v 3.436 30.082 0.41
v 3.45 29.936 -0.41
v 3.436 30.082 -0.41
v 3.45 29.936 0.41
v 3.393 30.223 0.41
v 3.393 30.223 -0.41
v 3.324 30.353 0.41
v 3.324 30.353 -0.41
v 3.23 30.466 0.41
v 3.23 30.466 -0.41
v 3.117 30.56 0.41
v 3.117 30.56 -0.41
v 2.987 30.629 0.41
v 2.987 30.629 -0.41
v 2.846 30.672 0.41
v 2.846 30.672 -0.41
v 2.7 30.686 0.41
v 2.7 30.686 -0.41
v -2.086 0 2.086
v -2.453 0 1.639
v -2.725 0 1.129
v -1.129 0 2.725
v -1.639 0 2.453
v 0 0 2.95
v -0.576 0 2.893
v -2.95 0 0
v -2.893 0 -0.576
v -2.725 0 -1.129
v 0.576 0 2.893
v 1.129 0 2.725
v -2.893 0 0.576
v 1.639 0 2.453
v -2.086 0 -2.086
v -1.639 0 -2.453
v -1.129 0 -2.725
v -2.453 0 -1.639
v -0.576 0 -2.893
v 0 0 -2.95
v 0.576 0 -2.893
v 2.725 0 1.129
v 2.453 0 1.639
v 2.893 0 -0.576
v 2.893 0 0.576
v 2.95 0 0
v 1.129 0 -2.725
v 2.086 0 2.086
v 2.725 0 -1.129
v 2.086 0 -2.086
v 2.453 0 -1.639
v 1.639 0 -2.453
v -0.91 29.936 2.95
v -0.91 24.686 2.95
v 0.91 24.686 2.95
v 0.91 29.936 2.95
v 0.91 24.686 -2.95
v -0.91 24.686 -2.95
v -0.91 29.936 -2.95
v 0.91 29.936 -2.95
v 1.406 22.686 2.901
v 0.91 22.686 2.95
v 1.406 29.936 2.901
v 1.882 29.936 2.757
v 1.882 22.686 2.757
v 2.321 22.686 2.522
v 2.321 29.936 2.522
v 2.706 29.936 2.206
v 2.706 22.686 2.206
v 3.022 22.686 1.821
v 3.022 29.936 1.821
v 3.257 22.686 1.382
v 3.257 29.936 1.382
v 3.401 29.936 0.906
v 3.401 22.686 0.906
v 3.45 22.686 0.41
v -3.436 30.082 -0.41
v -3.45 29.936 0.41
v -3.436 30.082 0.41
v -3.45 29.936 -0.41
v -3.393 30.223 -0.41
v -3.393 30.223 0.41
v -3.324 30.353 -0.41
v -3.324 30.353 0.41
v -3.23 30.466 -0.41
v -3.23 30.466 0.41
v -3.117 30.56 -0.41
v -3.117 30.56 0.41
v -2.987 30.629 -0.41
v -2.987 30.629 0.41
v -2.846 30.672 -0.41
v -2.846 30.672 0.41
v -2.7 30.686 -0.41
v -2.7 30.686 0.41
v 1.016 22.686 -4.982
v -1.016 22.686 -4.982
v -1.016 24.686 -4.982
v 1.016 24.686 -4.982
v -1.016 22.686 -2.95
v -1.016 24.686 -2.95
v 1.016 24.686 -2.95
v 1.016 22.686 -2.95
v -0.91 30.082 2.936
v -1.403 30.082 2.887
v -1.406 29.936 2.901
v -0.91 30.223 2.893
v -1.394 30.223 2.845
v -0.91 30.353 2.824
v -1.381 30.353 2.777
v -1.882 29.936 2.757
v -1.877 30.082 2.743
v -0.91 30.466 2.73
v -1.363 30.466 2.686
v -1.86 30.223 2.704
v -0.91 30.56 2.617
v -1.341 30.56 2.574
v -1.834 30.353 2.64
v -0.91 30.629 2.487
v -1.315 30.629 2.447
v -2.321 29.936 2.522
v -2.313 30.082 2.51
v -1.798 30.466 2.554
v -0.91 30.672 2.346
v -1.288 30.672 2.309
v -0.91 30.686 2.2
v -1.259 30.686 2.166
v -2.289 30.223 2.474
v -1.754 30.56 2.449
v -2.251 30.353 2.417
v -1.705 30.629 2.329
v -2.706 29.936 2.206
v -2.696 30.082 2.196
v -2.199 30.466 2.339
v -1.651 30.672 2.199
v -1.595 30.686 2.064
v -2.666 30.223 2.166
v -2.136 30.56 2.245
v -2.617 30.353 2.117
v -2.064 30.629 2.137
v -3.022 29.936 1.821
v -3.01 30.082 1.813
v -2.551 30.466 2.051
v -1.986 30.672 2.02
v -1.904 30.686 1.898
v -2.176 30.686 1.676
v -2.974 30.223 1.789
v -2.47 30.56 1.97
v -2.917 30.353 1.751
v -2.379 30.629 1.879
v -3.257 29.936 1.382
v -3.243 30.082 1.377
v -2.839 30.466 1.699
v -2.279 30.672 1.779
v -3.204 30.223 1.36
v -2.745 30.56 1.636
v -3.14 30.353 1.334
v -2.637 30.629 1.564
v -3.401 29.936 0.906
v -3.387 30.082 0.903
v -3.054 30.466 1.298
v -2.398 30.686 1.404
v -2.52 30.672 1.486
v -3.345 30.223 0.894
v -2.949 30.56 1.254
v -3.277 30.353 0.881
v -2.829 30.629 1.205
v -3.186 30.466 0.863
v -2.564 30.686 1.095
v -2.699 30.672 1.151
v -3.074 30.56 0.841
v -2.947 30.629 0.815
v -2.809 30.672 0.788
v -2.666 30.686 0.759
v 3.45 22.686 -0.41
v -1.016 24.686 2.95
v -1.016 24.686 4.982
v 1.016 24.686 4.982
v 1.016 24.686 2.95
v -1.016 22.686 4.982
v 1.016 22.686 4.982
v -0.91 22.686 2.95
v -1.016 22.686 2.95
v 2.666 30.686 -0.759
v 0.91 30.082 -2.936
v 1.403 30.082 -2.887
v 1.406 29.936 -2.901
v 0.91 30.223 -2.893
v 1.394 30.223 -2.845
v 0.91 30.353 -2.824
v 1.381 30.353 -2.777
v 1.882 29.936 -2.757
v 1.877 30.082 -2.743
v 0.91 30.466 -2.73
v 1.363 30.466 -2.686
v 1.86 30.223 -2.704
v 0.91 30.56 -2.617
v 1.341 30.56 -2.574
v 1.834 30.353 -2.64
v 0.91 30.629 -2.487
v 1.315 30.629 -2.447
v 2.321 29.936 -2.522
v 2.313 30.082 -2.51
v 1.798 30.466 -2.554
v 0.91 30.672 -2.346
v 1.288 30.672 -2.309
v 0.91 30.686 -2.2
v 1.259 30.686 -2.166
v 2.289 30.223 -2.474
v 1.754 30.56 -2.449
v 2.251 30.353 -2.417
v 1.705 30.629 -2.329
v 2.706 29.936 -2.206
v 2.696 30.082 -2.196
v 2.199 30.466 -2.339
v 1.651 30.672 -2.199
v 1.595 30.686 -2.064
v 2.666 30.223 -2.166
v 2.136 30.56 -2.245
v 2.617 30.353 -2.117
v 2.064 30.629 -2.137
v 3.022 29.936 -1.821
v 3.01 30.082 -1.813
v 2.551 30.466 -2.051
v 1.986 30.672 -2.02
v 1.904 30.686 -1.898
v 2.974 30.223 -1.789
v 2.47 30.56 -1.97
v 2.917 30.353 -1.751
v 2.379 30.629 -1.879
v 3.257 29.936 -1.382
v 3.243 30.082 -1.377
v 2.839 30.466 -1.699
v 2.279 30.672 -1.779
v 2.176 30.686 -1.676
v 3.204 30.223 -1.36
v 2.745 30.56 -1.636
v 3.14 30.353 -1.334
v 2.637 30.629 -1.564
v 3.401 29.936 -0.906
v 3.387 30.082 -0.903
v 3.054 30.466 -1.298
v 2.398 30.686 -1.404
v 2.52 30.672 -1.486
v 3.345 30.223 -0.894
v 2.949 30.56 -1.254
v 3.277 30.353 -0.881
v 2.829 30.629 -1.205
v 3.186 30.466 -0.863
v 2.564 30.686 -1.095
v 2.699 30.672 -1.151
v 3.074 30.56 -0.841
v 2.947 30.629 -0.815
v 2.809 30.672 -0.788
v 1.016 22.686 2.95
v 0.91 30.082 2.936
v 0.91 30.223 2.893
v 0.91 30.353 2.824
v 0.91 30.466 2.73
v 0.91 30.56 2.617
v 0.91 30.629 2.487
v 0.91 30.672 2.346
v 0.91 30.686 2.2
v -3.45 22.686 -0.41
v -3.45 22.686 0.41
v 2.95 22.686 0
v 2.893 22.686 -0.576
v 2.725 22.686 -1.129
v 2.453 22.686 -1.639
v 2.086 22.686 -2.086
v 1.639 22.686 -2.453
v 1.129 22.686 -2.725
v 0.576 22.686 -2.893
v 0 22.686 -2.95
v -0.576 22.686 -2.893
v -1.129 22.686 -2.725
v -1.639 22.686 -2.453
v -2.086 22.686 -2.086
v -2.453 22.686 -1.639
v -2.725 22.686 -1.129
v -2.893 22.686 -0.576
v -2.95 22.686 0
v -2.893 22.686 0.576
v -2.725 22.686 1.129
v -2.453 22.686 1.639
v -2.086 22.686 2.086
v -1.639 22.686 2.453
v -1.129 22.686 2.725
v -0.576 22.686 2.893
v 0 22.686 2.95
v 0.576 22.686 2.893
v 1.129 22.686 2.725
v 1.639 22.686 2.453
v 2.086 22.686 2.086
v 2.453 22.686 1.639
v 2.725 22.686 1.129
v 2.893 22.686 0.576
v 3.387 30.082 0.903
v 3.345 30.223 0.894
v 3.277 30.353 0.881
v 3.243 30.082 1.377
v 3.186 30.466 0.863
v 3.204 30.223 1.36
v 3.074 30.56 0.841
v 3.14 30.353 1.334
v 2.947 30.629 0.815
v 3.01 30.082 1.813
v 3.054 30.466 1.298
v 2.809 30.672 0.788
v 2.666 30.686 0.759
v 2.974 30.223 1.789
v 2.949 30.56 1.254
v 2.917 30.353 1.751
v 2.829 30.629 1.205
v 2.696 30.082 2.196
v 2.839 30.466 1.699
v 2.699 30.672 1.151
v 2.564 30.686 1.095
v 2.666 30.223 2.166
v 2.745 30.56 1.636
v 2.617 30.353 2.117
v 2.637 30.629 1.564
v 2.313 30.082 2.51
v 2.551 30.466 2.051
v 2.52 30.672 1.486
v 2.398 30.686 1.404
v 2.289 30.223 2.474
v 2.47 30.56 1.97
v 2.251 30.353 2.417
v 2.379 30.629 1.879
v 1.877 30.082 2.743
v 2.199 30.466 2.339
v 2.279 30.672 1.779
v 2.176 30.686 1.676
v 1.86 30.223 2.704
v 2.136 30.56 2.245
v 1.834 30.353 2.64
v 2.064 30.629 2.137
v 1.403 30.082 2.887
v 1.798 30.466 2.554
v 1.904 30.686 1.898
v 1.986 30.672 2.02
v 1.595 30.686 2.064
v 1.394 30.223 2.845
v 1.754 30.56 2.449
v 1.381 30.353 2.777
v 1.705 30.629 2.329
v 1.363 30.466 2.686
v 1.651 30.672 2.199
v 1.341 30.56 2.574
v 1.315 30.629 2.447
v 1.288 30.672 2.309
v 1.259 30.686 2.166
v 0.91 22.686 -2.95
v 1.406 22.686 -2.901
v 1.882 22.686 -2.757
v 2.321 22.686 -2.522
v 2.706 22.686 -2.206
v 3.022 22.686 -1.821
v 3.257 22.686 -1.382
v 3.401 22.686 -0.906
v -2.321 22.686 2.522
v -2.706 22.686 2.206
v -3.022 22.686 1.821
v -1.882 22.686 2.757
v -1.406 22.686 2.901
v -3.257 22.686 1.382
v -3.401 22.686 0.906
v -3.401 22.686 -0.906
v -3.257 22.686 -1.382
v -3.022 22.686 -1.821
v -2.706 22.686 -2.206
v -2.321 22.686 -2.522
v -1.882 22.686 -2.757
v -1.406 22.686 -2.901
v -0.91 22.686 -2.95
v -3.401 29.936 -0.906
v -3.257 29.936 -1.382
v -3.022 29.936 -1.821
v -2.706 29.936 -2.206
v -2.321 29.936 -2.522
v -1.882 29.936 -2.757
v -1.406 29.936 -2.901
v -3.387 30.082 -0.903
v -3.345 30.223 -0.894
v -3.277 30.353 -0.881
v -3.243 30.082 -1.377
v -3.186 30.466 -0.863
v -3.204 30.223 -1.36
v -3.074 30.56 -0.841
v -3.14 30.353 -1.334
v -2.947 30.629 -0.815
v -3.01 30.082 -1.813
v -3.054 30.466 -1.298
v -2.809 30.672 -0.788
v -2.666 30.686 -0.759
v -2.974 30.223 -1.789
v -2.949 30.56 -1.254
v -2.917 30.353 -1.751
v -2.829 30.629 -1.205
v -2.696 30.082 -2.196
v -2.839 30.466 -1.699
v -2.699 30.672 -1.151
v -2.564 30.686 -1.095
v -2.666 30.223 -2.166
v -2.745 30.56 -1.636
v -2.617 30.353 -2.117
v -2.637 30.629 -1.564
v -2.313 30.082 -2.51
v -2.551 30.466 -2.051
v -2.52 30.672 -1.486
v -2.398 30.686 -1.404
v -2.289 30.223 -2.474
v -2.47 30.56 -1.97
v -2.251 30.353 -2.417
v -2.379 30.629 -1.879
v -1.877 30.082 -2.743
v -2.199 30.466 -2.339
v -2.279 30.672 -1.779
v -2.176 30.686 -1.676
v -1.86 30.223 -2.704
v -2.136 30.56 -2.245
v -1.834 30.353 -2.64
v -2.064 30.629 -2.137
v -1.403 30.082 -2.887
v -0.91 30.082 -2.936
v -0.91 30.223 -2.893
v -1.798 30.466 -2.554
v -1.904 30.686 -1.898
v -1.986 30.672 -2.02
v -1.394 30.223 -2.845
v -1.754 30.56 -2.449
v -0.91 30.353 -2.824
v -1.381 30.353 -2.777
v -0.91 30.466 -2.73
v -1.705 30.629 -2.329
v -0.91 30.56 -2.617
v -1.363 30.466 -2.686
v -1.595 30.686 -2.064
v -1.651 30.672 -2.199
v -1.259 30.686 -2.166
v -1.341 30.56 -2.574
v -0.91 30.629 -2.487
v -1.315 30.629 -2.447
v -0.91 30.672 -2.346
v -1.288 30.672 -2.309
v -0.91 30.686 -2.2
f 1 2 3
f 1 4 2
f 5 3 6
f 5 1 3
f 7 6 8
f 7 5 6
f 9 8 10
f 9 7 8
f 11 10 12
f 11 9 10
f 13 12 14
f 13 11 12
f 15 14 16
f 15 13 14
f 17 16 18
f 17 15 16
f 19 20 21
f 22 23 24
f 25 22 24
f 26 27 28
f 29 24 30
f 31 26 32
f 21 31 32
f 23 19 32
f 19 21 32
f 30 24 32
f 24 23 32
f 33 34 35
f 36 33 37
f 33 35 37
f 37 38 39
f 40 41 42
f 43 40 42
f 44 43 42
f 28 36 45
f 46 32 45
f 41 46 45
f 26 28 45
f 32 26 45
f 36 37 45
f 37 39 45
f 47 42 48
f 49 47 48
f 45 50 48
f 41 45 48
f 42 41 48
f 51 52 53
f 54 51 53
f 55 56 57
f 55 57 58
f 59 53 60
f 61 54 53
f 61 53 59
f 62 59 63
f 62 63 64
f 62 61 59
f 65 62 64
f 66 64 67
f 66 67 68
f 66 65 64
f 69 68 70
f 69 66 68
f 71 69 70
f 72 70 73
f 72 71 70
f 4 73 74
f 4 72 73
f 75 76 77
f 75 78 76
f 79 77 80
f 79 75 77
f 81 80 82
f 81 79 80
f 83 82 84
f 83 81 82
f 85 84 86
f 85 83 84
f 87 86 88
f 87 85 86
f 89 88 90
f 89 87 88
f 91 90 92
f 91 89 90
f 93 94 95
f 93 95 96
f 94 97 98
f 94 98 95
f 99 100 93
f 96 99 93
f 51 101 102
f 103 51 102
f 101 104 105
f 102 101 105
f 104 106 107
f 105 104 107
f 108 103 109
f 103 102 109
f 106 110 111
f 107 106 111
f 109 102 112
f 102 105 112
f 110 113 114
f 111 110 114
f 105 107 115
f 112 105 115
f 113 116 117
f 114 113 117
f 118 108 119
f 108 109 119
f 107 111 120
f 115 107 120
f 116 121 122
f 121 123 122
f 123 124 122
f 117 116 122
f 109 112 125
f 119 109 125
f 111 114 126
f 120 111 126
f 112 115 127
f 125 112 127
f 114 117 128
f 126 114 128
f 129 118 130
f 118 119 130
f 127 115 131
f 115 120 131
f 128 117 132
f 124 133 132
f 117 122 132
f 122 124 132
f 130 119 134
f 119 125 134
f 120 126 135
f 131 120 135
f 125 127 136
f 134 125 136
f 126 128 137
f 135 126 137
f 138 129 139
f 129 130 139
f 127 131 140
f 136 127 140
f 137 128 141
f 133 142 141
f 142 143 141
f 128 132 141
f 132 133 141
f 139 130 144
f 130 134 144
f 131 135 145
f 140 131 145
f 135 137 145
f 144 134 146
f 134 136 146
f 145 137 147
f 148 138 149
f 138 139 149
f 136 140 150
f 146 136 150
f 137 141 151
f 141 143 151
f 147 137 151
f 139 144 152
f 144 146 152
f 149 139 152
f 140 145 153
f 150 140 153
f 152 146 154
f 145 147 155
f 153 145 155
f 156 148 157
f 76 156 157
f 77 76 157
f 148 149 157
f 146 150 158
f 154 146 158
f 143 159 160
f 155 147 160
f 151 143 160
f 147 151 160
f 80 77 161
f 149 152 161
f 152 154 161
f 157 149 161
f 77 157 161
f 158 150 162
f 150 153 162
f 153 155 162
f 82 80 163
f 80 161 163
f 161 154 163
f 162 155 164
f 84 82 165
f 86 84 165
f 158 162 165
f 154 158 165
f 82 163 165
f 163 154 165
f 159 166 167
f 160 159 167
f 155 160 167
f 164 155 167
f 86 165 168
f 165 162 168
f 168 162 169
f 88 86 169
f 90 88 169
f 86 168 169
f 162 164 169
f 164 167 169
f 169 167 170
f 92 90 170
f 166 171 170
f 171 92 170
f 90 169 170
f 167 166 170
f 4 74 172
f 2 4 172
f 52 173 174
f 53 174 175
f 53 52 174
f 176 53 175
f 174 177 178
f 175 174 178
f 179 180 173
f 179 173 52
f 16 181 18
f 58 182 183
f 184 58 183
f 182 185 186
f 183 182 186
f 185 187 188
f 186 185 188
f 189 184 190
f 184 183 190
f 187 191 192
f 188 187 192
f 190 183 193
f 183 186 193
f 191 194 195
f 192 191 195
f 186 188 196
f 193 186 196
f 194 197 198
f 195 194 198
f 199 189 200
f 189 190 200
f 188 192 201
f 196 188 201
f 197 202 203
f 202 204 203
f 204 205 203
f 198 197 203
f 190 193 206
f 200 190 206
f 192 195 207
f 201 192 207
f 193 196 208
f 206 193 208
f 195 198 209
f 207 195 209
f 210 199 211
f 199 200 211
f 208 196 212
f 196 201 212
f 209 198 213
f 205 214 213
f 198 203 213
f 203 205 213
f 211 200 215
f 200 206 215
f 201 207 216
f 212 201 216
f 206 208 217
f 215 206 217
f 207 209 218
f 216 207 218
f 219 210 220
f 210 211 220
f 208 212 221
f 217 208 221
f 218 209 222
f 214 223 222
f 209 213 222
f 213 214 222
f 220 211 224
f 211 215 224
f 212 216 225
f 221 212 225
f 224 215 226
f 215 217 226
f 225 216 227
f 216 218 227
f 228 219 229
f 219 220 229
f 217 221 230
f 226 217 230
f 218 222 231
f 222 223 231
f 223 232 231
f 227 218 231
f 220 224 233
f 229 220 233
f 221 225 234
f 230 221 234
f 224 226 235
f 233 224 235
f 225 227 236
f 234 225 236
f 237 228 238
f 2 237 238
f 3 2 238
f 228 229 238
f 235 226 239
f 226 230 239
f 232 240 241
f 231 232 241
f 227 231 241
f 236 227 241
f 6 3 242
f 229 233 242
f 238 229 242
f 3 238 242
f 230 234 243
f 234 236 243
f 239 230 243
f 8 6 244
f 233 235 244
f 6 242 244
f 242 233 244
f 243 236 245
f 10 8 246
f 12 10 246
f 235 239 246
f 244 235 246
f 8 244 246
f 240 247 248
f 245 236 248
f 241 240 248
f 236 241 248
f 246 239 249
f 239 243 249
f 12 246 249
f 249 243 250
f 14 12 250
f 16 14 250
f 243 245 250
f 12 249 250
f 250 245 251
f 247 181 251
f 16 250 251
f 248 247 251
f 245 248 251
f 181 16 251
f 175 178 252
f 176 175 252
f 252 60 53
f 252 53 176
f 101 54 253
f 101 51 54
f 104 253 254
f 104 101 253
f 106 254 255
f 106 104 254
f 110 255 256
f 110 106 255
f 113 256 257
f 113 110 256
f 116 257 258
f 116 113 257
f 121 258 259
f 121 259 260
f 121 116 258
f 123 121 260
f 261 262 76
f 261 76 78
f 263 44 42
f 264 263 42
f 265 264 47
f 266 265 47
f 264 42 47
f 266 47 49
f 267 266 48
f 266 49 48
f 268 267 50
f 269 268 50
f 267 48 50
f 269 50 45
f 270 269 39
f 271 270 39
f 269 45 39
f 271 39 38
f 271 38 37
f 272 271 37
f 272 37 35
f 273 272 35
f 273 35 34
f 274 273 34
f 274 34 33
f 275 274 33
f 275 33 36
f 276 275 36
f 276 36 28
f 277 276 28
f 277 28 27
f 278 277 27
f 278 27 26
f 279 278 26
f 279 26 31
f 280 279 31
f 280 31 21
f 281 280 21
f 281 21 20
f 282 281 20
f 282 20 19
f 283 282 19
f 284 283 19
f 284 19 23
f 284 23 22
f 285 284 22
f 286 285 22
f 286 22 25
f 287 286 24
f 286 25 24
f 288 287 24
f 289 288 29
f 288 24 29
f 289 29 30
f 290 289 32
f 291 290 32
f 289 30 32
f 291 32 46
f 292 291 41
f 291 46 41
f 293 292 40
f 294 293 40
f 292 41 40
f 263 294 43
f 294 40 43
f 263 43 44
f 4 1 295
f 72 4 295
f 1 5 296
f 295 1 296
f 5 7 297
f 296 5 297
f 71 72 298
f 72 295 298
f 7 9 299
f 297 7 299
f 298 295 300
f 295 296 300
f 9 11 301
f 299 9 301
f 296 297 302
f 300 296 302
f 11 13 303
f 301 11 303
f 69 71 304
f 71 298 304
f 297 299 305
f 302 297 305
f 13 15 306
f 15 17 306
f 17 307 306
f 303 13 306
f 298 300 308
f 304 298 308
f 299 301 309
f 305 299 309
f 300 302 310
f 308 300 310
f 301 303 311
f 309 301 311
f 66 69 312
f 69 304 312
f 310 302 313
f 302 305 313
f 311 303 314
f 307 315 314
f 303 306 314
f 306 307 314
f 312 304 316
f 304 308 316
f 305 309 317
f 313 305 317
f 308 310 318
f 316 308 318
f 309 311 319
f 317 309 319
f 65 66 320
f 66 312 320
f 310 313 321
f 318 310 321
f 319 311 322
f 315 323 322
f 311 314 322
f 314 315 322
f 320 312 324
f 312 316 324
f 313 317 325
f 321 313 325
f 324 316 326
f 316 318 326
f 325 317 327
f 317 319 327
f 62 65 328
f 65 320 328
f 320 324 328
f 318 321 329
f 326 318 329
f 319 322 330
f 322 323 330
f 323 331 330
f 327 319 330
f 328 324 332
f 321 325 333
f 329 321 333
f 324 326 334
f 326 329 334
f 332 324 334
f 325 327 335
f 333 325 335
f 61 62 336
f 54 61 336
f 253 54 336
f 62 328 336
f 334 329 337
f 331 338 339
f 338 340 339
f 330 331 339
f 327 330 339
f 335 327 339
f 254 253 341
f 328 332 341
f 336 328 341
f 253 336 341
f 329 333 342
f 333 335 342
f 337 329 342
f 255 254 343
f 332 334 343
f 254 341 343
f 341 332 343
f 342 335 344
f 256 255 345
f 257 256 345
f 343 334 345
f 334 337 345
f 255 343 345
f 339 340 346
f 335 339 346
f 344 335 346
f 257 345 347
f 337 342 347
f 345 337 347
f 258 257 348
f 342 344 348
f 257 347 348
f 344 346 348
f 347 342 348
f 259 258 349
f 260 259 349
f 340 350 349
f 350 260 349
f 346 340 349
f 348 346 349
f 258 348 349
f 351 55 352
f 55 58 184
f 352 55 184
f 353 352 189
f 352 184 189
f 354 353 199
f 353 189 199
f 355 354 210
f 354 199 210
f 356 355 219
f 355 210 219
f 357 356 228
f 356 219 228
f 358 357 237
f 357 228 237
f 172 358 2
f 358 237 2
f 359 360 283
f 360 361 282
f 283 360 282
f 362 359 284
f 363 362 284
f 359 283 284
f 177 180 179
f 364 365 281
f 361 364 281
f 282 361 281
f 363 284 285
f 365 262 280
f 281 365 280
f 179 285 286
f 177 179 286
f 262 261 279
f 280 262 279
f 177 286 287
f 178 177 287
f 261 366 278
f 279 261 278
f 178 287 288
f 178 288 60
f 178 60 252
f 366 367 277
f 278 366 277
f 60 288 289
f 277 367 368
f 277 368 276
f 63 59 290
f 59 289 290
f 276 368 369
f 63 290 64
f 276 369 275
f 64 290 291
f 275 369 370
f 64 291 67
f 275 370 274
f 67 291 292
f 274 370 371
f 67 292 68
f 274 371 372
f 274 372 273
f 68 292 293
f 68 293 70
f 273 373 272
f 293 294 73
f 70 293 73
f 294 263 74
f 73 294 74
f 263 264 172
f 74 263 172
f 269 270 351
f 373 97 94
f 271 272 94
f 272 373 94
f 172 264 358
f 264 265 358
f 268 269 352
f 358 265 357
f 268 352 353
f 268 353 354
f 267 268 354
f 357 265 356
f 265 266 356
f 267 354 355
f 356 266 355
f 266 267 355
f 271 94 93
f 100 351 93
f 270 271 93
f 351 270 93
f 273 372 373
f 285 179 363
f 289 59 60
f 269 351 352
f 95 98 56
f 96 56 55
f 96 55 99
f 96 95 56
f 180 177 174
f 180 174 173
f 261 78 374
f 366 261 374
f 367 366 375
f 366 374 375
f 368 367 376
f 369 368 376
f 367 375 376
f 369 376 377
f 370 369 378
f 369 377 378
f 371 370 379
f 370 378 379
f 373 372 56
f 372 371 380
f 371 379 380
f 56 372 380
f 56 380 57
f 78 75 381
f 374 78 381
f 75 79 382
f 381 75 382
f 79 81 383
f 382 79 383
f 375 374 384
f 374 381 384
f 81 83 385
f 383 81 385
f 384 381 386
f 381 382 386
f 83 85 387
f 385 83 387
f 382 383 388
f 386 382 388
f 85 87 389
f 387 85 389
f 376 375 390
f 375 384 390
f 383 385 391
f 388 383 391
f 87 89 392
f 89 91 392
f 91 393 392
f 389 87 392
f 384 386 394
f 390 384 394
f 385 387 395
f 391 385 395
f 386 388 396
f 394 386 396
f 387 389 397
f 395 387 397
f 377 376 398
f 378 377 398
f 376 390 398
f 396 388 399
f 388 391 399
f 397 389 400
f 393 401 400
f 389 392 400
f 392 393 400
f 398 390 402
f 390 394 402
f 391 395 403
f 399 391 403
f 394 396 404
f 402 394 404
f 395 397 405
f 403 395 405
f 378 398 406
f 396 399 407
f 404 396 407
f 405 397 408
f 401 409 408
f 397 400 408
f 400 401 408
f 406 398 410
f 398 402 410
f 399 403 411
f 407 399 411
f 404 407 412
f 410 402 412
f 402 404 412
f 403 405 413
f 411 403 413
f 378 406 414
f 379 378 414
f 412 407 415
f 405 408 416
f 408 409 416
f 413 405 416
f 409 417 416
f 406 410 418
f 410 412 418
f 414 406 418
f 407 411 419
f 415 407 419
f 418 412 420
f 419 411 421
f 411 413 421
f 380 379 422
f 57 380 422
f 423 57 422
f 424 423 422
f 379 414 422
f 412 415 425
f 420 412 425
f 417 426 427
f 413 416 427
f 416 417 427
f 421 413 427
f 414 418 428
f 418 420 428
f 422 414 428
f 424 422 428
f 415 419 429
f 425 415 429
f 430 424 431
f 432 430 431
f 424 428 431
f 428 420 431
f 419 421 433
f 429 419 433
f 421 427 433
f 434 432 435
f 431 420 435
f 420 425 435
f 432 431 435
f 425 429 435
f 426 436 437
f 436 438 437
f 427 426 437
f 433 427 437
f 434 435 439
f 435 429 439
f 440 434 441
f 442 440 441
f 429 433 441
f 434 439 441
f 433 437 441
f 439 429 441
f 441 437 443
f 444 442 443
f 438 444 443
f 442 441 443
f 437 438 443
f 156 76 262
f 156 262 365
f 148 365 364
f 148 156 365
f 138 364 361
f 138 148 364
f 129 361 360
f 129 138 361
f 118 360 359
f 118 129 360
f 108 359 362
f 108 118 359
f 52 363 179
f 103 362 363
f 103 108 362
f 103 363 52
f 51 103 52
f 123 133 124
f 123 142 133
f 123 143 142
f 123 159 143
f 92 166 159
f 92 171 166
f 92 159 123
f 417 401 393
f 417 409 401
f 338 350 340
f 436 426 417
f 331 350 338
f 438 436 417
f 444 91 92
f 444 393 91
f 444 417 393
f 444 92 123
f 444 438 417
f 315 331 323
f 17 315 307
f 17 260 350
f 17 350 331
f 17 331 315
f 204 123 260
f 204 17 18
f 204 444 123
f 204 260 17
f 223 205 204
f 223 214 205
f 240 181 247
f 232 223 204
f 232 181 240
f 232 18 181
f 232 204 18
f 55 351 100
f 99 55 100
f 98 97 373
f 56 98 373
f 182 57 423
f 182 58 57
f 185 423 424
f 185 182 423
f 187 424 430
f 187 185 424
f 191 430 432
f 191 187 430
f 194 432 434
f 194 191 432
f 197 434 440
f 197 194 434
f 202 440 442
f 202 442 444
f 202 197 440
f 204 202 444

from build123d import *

# Parameters (mm, degrees)
SKETCH1_R           = 2.95
BOSS_EXTRUDE1_DEPTH = 22.686
SKETCH3_W           = 6.9
SKETCH3_H           = 5.9
BOSS_EXTRUDE2_DEPTH = 8
FILLET1_R           = 2.54
FILLET2_R           = 0.75
BOSS_EXTRUDE3_START = -8
SKETCH4_W           = 2.032
SKETCH4_H           = 2.032
BOSS_EXTRUDE3_DEPTH = 2


with BuildPart() as part:
    # Sketch1 → Boss-Extrude1 (new body)
    with BuildSketch(Plane(origin=(0, 0, 0), x_dir=(1, 0, 0), z_dir=(0, 1, 0))):
        Circle(SKETCH1_R)
    extrude(amount=BOSS_EXTRUDE1_DEPTH)

    # Sketch3 → Boss-Extrude2 (add)
    with BuildSketch(Plane(origin=(0, 22.686, 0), x_dir=(1, 0, 0), z_dir=(0, 1, 0))):
        Rectangle(SKETCH3_W, SKETCH3_H)
    extrude(amount=BOSS_EXTRUDE2_DEPTH)

    # Fillet1
    fillet1_edges = [part.edges().sort_by_distance(p)[0] for p in [
        (3.45, 26.686, 2.95),
        (3.45, 26.686, -2.95),
        (-3.45, 26.686, -2.95),
        (-3.45, 26.686, 2.95),
    ]]
    fillet(fillet1_edges, radius=FILLET1_R)

    # Fillet2
    fillet2_edges = [part.edges().sort_by_distance(p)[0] for p in [
        (-3.45, 30.686, 0),
        (0, 30.686, -2.95),
        (3.45, 30.686, 0),
        (0, 30.686, 2.95),
        (-2.706051224, 30.686, 2.206051224),
        (2.706051224, 30.686, 2.206051224),
        (2.706051224, 30.686, -2.206051224),
        (-2.706051224, 30.686, -2.206051224),
    ]]
    fillet(fillet2_edges, radius=FILLET2_R)

    # Sketch4 → Boss-Extrude3 (add)
    with BuildSketch(Plane(origin=(0, 30.686, 0), x_dir=(1, 0, 0), z_dir=(0, 1, 0)).offset(BOSS_EXTRUDE3_START)):
        with Locations((0, 3.966)):
            Rectangle(SKETCH4_W, SKETCH4_H)
        with Locations((0, -3.966)):
            Rectangle(SKETCH4_W, SKETCH4_H)
    extrude(amount=BOSS_EXTRUDE3_DEPTH)


solid = part.part
